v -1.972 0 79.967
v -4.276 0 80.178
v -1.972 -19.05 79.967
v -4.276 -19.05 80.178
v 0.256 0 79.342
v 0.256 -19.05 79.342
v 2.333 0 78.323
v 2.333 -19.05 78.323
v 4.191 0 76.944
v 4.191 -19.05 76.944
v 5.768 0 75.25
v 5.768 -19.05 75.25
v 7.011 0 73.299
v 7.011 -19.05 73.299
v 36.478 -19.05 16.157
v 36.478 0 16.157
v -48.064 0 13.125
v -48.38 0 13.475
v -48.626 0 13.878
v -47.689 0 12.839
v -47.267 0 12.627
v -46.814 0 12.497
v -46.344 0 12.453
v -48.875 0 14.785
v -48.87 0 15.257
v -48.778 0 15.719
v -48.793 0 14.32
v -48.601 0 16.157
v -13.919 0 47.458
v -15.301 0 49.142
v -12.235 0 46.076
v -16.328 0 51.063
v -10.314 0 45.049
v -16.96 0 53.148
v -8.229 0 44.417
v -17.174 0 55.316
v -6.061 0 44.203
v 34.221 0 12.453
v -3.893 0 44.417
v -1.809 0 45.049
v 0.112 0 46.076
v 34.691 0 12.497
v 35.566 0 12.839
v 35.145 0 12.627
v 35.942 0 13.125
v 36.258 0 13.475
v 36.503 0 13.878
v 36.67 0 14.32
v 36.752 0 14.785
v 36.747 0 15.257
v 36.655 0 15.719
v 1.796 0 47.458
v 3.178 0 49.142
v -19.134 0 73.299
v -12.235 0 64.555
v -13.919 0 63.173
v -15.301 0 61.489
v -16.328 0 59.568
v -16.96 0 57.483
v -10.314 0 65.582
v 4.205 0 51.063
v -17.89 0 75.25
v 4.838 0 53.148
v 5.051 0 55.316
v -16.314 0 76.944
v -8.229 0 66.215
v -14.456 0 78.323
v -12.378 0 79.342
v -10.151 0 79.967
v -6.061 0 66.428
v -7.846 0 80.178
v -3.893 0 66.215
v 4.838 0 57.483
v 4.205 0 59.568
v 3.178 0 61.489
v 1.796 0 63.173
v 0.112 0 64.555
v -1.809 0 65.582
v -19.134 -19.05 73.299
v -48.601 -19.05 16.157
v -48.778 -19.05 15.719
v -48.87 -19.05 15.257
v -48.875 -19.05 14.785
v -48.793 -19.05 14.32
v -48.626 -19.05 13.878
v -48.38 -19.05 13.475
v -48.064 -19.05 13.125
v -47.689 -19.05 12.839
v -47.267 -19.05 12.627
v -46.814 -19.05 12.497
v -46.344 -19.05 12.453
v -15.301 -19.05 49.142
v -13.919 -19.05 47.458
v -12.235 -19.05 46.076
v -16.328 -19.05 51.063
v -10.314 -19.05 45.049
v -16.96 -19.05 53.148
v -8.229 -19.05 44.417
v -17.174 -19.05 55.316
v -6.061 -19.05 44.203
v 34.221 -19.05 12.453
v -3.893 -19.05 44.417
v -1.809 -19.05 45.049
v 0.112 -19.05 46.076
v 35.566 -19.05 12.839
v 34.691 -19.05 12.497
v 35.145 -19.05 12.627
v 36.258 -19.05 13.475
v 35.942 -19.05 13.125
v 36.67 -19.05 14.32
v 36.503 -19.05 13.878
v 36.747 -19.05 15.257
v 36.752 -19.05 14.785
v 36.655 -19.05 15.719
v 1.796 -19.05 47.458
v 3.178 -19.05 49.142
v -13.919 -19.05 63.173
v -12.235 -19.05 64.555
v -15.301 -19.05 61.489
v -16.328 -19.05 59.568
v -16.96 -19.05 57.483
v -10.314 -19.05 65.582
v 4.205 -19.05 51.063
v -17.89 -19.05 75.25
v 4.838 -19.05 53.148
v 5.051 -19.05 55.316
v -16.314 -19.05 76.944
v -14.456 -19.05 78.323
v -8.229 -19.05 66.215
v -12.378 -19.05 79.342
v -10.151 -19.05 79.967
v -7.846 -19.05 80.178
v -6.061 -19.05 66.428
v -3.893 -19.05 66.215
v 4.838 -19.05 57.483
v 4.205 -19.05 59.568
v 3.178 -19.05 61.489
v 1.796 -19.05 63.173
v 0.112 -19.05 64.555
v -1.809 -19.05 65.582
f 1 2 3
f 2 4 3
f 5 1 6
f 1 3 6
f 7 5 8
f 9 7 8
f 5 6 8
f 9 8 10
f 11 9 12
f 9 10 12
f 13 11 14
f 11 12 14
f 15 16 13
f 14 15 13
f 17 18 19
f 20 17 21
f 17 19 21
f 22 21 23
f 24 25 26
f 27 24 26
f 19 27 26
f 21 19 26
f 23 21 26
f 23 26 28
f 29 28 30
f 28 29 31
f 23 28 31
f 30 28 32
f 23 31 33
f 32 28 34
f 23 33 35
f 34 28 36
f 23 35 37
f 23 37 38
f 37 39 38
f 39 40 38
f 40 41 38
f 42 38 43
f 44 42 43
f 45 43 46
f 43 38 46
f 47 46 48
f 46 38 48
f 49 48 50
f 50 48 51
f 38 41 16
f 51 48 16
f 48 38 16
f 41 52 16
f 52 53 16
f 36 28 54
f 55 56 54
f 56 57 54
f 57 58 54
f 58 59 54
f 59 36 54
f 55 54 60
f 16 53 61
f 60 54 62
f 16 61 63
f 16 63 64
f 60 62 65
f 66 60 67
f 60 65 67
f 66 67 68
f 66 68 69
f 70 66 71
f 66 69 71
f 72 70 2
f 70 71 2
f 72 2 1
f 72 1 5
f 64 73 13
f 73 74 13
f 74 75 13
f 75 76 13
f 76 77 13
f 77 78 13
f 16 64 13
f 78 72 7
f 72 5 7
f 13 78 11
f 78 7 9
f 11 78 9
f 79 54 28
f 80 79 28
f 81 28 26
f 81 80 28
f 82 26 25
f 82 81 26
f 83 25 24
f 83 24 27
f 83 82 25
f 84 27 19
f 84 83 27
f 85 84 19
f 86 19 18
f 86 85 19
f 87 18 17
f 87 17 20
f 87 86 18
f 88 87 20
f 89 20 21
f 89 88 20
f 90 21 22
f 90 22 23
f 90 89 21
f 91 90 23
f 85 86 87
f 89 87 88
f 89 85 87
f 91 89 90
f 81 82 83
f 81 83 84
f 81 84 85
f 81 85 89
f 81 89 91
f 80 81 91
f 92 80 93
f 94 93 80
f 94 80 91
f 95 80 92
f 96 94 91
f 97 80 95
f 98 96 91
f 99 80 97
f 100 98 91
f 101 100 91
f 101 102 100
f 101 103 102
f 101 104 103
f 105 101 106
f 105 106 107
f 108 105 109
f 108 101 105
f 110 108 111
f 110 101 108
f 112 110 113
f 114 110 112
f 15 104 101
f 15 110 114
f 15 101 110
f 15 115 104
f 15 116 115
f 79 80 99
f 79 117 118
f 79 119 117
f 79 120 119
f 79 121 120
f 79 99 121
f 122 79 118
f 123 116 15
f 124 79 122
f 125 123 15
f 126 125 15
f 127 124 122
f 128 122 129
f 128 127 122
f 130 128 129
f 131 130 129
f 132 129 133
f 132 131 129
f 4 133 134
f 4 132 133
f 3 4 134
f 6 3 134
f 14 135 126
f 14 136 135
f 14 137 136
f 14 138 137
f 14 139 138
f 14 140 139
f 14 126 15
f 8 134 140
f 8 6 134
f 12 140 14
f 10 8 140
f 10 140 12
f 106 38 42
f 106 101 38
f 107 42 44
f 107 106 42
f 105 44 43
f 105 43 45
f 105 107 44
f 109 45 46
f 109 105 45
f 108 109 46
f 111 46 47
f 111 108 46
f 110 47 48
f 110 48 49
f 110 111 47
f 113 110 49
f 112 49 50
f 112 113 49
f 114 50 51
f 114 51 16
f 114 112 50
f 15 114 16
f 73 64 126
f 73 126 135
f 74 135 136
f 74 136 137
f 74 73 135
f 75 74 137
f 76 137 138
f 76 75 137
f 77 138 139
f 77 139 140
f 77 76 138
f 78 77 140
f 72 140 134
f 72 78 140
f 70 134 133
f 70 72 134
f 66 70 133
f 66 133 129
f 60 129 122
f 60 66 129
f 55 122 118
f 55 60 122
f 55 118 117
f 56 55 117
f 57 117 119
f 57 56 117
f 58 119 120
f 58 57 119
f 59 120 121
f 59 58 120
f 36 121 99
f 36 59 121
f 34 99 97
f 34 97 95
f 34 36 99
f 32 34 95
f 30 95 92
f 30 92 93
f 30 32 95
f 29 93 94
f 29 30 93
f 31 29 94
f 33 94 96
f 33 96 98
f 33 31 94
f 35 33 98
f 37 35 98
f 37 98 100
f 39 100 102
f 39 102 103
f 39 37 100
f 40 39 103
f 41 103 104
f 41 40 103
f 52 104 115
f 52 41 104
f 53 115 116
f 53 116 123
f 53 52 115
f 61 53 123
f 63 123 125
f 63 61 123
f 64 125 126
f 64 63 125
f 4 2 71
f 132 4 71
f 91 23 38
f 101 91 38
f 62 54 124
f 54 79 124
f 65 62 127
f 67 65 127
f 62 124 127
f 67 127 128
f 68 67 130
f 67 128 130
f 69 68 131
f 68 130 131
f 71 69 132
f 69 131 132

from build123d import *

# Parameters (mm, degrees)
F0_R     = 11.1125
F1_DEPTH = 19.05
F2_R     = 12.7
F3_R     = 2.54


with BuildPart() as f1:
    # F0 (on Front) → F1 (new body)
    with BuildSketch(Plane.XZ):
        Polygon((-15.586365, 80.178106), (-50.511365, 12.453041), (38.388635, 12.453041), (3.463635, 80.178106), align=None)
        with Locations((-6.061365, 55.315541)):
            Circle(F0_R, mode=Mode.SUBTRACT)
    extrude(amount=F1_DEPTH)

    # F2
    f2_edges = [f1.edges().sort_by_distance(p)[0] for p in [
        (-15.586365, -9.525, 80.178106),
        (3.463635, -9.525, 80.178106),
    ]]
    fillet(f2_edges, radius=F2_R)

    # F3
    f3_edges = [f1.edges().sort_by_distance(p)[0] for p in [
        (-50.511365, -9.525, 12.453041),
        (38.388635, -9.525, 12.453041),
    ]]
    fillet(f3_edges, radius=F3_R)


solid = f1.part
